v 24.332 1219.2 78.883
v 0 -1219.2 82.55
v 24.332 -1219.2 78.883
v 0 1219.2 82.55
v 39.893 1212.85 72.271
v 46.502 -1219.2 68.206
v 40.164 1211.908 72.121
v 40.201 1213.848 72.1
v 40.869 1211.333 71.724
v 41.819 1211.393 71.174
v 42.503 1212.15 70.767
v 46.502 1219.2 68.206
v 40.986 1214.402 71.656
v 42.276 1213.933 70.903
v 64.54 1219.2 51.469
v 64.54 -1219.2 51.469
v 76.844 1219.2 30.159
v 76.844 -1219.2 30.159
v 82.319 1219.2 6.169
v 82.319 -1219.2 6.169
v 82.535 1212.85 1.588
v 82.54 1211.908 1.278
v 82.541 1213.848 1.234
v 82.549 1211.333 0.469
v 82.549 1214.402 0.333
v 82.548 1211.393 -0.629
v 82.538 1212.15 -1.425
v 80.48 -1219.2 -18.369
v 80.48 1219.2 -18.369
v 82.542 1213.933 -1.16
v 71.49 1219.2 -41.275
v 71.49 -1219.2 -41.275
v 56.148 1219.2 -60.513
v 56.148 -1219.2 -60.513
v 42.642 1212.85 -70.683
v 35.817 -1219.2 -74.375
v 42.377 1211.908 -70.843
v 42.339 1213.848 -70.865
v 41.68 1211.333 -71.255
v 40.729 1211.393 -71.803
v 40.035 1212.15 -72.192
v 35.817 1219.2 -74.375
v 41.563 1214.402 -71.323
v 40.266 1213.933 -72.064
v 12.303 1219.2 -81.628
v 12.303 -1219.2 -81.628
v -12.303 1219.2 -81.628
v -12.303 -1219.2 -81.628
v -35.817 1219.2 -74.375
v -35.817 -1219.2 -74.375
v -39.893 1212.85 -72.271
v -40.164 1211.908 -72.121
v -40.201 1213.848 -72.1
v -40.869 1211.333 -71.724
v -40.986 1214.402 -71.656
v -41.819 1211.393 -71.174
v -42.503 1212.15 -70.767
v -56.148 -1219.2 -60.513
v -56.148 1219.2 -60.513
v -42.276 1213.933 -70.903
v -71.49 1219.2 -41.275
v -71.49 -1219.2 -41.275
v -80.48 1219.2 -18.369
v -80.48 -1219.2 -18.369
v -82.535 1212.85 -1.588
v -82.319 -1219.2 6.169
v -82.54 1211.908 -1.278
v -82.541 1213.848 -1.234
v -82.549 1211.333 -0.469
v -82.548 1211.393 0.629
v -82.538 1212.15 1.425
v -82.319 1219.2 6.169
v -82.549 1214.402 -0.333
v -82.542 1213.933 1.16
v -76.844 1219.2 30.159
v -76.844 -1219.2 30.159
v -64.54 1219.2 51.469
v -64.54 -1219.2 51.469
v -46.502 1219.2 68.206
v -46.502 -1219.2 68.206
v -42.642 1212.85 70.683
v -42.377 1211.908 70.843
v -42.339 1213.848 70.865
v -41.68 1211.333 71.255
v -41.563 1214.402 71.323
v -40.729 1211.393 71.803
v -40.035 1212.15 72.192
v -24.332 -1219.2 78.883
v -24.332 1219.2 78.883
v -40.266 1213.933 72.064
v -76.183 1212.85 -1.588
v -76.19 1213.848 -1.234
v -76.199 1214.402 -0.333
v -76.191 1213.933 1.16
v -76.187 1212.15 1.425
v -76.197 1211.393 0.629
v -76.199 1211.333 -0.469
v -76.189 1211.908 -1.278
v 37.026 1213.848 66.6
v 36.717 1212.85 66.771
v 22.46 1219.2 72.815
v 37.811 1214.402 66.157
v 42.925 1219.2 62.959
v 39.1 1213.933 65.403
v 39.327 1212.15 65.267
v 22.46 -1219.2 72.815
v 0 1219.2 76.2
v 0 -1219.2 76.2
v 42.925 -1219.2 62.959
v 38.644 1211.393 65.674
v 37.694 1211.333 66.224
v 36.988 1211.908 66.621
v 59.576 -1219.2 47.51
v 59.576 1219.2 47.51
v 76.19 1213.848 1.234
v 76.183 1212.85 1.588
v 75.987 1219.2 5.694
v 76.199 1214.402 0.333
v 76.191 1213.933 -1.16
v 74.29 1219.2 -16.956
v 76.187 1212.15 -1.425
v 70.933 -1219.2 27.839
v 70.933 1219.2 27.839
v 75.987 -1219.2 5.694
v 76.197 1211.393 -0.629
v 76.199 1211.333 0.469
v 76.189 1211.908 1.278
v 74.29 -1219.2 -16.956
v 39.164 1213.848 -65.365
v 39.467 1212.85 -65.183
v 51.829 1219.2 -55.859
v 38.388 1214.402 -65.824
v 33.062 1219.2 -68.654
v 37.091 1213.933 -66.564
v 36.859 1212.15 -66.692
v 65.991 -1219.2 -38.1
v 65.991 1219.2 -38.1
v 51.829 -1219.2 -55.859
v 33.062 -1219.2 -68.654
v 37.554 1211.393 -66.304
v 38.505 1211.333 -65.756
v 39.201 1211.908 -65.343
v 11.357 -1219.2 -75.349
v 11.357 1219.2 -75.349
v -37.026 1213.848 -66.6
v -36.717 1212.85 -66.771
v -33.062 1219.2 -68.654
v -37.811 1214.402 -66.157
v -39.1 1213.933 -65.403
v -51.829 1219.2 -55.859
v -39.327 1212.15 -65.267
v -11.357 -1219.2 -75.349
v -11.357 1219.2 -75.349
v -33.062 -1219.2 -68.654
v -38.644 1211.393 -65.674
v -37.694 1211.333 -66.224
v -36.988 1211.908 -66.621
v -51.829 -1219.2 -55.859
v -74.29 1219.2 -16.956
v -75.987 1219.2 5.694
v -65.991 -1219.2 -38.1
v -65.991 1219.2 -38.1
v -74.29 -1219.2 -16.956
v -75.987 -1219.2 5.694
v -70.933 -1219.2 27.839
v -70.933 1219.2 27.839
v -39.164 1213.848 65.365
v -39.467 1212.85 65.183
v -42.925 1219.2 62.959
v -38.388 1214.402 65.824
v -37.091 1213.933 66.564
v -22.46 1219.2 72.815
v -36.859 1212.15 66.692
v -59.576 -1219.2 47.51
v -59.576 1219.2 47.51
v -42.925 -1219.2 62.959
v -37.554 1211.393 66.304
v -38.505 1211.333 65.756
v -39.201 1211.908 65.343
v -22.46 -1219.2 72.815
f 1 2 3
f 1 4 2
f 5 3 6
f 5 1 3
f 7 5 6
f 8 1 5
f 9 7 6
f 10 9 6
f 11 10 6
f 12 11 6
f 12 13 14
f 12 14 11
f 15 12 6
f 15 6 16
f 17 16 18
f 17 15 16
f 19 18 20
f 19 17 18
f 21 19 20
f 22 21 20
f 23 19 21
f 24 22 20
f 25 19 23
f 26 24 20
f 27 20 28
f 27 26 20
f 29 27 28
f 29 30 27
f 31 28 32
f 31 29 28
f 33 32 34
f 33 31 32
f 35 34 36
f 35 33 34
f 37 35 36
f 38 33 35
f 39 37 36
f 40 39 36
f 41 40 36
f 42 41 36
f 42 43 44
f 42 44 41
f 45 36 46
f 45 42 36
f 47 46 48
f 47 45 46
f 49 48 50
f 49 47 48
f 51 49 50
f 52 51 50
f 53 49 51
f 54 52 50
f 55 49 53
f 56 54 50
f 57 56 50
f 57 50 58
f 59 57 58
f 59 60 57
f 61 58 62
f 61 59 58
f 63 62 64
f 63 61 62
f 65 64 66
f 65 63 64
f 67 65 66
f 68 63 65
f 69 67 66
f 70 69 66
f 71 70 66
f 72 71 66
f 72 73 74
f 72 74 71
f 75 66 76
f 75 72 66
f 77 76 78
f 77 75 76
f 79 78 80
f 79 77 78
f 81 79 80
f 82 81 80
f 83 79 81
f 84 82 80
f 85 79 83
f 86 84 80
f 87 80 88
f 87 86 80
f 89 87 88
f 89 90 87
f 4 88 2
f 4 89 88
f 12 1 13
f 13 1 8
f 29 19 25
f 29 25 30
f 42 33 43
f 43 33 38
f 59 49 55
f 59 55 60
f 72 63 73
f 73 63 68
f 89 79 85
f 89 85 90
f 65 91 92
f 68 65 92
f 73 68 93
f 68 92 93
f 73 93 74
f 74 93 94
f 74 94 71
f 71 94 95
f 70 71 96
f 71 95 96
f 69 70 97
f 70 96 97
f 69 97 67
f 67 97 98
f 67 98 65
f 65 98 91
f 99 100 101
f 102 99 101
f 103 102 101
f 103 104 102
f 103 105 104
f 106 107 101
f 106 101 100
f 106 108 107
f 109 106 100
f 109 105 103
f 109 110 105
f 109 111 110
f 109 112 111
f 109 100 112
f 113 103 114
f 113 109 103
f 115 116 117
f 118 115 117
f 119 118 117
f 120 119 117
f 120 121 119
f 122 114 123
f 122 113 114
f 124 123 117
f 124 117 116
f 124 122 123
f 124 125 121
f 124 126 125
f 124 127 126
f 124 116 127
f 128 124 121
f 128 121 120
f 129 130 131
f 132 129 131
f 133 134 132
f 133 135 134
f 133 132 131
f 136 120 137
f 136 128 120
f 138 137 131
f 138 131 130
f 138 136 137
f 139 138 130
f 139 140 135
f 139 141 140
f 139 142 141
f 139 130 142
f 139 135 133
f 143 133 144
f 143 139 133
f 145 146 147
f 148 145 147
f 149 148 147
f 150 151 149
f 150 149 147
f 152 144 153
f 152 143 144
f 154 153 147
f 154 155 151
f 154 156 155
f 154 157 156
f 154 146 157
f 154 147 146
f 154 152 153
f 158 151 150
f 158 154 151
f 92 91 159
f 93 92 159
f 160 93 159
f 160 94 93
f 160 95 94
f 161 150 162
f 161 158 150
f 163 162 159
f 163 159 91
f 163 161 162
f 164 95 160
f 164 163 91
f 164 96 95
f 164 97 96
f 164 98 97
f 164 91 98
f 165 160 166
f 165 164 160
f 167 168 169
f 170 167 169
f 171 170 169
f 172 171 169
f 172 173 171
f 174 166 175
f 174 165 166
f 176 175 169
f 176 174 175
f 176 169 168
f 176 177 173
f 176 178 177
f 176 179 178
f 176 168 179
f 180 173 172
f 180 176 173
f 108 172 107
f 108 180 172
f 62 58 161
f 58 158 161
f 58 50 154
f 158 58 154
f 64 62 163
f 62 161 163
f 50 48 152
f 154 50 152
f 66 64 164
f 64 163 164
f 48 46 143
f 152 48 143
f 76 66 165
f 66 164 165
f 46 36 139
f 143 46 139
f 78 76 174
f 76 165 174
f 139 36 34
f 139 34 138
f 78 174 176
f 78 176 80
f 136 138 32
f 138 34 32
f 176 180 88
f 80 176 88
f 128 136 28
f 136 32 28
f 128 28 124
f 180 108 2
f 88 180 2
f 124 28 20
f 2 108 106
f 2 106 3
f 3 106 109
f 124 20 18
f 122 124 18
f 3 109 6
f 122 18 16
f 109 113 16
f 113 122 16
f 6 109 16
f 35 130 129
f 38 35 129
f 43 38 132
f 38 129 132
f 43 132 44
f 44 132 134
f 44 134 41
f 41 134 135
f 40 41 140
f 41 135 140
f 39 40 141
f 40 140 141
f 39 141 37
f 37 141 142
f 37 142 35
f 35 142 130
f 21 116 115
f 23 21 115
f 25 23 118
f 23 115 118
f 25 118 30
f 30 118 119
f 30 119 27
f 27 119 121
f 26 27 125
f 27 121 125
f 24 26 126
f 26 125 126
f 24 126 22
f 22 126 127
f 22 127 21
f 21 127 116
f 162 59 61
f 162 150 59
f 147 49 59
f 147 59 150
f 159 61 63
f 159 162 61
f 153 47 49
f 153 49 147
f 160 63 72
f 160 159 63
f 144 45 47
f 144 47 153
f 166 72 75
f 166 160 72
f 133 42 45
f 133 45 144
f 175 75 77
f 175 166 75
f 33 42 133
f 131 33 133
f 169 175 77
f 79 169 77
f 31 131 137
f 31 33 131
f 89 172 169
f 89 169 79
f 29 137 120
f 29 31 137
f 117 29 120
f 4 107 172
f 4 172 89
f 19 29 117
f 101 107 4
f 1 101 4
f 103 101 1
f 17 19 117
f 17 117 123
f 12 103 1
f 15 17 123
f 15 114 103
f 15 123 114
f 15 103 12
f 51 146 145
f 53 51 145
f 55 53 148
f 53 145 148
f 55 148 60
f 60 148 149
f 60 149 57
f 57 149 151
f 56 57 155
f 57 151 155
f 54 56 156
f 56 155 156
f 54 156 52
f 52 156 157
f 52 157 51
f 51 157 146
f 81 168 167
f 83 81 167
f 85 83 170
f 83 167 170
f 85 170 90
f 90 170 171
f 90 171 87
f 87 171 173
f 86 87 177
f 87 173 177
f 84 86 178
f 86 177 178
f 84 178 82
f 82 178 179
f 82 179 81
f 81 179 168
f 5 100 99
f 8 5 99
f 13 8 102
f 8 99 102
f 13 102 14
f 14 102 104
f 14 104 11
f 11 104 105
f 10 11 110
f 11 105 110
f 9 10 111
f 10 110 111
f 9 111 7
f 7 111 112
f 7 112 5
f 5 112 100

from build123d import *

# Parameters (mm, degrees)
SKETCH1_R           = 82.55
SKETCH1_R_2         = 76.2
BOSS_EXTRUDE1_DEPTH = 1219.2
SKETCH2_R           = 1.5875
CUT_EXTRUDE1_DEPTH  = 1225.77656942
CIRPATTERN1_COUNT   = 6


with BuildPart() as part:
    # Sketch1 → Boss-Extrude1 (new, symmetric)
    with BuildSketch(Plane(origin=(0, 0, 0), x_dir=(1, 0, 0), z_dir=(0, 1, 0))):
        with Locations(Location((0, 0, 0), (0, 0, 270))):
            Circle(SKETCH1_R)
        with Locations(Location((0, 0, 0), (0, 0, 270))):
            Circle(SKETCH1_R_2, mode=Mode.SUBTRACT)
    extrude(amount=BOSS_EXTRUDE1_DEPTH, both=True)

    # Sketch2 → Cut-Extrude1 (cut, through all)
    with BuildSketch(Plane(origin=(0, 0, 0), x_dir=(0, 0, -1), z_dir=(1, 0, 0))):
        with Locations((0, 1212.85)):
            Circle(SKETCH2_R)
    cut_extrude1 = extrude(amount=-CUT_EXTRUDE1_DEPTH, mode=Mode.SUBTRACT)

    # CirPattern1: Cut-Extrude1 ×6 about axis
    cirpattern1_axis = Axis((0, 1219.2, 0), (0, 1, 0))
    for i in range(1, CIRPATTERN1_COUNT):
        add(cut_extrude1.rotate(cirpattern1_axis, i * 360 / CIRPATTERN1_COUNT), mode=Mode.SUBTRACT)


solid = part.part
